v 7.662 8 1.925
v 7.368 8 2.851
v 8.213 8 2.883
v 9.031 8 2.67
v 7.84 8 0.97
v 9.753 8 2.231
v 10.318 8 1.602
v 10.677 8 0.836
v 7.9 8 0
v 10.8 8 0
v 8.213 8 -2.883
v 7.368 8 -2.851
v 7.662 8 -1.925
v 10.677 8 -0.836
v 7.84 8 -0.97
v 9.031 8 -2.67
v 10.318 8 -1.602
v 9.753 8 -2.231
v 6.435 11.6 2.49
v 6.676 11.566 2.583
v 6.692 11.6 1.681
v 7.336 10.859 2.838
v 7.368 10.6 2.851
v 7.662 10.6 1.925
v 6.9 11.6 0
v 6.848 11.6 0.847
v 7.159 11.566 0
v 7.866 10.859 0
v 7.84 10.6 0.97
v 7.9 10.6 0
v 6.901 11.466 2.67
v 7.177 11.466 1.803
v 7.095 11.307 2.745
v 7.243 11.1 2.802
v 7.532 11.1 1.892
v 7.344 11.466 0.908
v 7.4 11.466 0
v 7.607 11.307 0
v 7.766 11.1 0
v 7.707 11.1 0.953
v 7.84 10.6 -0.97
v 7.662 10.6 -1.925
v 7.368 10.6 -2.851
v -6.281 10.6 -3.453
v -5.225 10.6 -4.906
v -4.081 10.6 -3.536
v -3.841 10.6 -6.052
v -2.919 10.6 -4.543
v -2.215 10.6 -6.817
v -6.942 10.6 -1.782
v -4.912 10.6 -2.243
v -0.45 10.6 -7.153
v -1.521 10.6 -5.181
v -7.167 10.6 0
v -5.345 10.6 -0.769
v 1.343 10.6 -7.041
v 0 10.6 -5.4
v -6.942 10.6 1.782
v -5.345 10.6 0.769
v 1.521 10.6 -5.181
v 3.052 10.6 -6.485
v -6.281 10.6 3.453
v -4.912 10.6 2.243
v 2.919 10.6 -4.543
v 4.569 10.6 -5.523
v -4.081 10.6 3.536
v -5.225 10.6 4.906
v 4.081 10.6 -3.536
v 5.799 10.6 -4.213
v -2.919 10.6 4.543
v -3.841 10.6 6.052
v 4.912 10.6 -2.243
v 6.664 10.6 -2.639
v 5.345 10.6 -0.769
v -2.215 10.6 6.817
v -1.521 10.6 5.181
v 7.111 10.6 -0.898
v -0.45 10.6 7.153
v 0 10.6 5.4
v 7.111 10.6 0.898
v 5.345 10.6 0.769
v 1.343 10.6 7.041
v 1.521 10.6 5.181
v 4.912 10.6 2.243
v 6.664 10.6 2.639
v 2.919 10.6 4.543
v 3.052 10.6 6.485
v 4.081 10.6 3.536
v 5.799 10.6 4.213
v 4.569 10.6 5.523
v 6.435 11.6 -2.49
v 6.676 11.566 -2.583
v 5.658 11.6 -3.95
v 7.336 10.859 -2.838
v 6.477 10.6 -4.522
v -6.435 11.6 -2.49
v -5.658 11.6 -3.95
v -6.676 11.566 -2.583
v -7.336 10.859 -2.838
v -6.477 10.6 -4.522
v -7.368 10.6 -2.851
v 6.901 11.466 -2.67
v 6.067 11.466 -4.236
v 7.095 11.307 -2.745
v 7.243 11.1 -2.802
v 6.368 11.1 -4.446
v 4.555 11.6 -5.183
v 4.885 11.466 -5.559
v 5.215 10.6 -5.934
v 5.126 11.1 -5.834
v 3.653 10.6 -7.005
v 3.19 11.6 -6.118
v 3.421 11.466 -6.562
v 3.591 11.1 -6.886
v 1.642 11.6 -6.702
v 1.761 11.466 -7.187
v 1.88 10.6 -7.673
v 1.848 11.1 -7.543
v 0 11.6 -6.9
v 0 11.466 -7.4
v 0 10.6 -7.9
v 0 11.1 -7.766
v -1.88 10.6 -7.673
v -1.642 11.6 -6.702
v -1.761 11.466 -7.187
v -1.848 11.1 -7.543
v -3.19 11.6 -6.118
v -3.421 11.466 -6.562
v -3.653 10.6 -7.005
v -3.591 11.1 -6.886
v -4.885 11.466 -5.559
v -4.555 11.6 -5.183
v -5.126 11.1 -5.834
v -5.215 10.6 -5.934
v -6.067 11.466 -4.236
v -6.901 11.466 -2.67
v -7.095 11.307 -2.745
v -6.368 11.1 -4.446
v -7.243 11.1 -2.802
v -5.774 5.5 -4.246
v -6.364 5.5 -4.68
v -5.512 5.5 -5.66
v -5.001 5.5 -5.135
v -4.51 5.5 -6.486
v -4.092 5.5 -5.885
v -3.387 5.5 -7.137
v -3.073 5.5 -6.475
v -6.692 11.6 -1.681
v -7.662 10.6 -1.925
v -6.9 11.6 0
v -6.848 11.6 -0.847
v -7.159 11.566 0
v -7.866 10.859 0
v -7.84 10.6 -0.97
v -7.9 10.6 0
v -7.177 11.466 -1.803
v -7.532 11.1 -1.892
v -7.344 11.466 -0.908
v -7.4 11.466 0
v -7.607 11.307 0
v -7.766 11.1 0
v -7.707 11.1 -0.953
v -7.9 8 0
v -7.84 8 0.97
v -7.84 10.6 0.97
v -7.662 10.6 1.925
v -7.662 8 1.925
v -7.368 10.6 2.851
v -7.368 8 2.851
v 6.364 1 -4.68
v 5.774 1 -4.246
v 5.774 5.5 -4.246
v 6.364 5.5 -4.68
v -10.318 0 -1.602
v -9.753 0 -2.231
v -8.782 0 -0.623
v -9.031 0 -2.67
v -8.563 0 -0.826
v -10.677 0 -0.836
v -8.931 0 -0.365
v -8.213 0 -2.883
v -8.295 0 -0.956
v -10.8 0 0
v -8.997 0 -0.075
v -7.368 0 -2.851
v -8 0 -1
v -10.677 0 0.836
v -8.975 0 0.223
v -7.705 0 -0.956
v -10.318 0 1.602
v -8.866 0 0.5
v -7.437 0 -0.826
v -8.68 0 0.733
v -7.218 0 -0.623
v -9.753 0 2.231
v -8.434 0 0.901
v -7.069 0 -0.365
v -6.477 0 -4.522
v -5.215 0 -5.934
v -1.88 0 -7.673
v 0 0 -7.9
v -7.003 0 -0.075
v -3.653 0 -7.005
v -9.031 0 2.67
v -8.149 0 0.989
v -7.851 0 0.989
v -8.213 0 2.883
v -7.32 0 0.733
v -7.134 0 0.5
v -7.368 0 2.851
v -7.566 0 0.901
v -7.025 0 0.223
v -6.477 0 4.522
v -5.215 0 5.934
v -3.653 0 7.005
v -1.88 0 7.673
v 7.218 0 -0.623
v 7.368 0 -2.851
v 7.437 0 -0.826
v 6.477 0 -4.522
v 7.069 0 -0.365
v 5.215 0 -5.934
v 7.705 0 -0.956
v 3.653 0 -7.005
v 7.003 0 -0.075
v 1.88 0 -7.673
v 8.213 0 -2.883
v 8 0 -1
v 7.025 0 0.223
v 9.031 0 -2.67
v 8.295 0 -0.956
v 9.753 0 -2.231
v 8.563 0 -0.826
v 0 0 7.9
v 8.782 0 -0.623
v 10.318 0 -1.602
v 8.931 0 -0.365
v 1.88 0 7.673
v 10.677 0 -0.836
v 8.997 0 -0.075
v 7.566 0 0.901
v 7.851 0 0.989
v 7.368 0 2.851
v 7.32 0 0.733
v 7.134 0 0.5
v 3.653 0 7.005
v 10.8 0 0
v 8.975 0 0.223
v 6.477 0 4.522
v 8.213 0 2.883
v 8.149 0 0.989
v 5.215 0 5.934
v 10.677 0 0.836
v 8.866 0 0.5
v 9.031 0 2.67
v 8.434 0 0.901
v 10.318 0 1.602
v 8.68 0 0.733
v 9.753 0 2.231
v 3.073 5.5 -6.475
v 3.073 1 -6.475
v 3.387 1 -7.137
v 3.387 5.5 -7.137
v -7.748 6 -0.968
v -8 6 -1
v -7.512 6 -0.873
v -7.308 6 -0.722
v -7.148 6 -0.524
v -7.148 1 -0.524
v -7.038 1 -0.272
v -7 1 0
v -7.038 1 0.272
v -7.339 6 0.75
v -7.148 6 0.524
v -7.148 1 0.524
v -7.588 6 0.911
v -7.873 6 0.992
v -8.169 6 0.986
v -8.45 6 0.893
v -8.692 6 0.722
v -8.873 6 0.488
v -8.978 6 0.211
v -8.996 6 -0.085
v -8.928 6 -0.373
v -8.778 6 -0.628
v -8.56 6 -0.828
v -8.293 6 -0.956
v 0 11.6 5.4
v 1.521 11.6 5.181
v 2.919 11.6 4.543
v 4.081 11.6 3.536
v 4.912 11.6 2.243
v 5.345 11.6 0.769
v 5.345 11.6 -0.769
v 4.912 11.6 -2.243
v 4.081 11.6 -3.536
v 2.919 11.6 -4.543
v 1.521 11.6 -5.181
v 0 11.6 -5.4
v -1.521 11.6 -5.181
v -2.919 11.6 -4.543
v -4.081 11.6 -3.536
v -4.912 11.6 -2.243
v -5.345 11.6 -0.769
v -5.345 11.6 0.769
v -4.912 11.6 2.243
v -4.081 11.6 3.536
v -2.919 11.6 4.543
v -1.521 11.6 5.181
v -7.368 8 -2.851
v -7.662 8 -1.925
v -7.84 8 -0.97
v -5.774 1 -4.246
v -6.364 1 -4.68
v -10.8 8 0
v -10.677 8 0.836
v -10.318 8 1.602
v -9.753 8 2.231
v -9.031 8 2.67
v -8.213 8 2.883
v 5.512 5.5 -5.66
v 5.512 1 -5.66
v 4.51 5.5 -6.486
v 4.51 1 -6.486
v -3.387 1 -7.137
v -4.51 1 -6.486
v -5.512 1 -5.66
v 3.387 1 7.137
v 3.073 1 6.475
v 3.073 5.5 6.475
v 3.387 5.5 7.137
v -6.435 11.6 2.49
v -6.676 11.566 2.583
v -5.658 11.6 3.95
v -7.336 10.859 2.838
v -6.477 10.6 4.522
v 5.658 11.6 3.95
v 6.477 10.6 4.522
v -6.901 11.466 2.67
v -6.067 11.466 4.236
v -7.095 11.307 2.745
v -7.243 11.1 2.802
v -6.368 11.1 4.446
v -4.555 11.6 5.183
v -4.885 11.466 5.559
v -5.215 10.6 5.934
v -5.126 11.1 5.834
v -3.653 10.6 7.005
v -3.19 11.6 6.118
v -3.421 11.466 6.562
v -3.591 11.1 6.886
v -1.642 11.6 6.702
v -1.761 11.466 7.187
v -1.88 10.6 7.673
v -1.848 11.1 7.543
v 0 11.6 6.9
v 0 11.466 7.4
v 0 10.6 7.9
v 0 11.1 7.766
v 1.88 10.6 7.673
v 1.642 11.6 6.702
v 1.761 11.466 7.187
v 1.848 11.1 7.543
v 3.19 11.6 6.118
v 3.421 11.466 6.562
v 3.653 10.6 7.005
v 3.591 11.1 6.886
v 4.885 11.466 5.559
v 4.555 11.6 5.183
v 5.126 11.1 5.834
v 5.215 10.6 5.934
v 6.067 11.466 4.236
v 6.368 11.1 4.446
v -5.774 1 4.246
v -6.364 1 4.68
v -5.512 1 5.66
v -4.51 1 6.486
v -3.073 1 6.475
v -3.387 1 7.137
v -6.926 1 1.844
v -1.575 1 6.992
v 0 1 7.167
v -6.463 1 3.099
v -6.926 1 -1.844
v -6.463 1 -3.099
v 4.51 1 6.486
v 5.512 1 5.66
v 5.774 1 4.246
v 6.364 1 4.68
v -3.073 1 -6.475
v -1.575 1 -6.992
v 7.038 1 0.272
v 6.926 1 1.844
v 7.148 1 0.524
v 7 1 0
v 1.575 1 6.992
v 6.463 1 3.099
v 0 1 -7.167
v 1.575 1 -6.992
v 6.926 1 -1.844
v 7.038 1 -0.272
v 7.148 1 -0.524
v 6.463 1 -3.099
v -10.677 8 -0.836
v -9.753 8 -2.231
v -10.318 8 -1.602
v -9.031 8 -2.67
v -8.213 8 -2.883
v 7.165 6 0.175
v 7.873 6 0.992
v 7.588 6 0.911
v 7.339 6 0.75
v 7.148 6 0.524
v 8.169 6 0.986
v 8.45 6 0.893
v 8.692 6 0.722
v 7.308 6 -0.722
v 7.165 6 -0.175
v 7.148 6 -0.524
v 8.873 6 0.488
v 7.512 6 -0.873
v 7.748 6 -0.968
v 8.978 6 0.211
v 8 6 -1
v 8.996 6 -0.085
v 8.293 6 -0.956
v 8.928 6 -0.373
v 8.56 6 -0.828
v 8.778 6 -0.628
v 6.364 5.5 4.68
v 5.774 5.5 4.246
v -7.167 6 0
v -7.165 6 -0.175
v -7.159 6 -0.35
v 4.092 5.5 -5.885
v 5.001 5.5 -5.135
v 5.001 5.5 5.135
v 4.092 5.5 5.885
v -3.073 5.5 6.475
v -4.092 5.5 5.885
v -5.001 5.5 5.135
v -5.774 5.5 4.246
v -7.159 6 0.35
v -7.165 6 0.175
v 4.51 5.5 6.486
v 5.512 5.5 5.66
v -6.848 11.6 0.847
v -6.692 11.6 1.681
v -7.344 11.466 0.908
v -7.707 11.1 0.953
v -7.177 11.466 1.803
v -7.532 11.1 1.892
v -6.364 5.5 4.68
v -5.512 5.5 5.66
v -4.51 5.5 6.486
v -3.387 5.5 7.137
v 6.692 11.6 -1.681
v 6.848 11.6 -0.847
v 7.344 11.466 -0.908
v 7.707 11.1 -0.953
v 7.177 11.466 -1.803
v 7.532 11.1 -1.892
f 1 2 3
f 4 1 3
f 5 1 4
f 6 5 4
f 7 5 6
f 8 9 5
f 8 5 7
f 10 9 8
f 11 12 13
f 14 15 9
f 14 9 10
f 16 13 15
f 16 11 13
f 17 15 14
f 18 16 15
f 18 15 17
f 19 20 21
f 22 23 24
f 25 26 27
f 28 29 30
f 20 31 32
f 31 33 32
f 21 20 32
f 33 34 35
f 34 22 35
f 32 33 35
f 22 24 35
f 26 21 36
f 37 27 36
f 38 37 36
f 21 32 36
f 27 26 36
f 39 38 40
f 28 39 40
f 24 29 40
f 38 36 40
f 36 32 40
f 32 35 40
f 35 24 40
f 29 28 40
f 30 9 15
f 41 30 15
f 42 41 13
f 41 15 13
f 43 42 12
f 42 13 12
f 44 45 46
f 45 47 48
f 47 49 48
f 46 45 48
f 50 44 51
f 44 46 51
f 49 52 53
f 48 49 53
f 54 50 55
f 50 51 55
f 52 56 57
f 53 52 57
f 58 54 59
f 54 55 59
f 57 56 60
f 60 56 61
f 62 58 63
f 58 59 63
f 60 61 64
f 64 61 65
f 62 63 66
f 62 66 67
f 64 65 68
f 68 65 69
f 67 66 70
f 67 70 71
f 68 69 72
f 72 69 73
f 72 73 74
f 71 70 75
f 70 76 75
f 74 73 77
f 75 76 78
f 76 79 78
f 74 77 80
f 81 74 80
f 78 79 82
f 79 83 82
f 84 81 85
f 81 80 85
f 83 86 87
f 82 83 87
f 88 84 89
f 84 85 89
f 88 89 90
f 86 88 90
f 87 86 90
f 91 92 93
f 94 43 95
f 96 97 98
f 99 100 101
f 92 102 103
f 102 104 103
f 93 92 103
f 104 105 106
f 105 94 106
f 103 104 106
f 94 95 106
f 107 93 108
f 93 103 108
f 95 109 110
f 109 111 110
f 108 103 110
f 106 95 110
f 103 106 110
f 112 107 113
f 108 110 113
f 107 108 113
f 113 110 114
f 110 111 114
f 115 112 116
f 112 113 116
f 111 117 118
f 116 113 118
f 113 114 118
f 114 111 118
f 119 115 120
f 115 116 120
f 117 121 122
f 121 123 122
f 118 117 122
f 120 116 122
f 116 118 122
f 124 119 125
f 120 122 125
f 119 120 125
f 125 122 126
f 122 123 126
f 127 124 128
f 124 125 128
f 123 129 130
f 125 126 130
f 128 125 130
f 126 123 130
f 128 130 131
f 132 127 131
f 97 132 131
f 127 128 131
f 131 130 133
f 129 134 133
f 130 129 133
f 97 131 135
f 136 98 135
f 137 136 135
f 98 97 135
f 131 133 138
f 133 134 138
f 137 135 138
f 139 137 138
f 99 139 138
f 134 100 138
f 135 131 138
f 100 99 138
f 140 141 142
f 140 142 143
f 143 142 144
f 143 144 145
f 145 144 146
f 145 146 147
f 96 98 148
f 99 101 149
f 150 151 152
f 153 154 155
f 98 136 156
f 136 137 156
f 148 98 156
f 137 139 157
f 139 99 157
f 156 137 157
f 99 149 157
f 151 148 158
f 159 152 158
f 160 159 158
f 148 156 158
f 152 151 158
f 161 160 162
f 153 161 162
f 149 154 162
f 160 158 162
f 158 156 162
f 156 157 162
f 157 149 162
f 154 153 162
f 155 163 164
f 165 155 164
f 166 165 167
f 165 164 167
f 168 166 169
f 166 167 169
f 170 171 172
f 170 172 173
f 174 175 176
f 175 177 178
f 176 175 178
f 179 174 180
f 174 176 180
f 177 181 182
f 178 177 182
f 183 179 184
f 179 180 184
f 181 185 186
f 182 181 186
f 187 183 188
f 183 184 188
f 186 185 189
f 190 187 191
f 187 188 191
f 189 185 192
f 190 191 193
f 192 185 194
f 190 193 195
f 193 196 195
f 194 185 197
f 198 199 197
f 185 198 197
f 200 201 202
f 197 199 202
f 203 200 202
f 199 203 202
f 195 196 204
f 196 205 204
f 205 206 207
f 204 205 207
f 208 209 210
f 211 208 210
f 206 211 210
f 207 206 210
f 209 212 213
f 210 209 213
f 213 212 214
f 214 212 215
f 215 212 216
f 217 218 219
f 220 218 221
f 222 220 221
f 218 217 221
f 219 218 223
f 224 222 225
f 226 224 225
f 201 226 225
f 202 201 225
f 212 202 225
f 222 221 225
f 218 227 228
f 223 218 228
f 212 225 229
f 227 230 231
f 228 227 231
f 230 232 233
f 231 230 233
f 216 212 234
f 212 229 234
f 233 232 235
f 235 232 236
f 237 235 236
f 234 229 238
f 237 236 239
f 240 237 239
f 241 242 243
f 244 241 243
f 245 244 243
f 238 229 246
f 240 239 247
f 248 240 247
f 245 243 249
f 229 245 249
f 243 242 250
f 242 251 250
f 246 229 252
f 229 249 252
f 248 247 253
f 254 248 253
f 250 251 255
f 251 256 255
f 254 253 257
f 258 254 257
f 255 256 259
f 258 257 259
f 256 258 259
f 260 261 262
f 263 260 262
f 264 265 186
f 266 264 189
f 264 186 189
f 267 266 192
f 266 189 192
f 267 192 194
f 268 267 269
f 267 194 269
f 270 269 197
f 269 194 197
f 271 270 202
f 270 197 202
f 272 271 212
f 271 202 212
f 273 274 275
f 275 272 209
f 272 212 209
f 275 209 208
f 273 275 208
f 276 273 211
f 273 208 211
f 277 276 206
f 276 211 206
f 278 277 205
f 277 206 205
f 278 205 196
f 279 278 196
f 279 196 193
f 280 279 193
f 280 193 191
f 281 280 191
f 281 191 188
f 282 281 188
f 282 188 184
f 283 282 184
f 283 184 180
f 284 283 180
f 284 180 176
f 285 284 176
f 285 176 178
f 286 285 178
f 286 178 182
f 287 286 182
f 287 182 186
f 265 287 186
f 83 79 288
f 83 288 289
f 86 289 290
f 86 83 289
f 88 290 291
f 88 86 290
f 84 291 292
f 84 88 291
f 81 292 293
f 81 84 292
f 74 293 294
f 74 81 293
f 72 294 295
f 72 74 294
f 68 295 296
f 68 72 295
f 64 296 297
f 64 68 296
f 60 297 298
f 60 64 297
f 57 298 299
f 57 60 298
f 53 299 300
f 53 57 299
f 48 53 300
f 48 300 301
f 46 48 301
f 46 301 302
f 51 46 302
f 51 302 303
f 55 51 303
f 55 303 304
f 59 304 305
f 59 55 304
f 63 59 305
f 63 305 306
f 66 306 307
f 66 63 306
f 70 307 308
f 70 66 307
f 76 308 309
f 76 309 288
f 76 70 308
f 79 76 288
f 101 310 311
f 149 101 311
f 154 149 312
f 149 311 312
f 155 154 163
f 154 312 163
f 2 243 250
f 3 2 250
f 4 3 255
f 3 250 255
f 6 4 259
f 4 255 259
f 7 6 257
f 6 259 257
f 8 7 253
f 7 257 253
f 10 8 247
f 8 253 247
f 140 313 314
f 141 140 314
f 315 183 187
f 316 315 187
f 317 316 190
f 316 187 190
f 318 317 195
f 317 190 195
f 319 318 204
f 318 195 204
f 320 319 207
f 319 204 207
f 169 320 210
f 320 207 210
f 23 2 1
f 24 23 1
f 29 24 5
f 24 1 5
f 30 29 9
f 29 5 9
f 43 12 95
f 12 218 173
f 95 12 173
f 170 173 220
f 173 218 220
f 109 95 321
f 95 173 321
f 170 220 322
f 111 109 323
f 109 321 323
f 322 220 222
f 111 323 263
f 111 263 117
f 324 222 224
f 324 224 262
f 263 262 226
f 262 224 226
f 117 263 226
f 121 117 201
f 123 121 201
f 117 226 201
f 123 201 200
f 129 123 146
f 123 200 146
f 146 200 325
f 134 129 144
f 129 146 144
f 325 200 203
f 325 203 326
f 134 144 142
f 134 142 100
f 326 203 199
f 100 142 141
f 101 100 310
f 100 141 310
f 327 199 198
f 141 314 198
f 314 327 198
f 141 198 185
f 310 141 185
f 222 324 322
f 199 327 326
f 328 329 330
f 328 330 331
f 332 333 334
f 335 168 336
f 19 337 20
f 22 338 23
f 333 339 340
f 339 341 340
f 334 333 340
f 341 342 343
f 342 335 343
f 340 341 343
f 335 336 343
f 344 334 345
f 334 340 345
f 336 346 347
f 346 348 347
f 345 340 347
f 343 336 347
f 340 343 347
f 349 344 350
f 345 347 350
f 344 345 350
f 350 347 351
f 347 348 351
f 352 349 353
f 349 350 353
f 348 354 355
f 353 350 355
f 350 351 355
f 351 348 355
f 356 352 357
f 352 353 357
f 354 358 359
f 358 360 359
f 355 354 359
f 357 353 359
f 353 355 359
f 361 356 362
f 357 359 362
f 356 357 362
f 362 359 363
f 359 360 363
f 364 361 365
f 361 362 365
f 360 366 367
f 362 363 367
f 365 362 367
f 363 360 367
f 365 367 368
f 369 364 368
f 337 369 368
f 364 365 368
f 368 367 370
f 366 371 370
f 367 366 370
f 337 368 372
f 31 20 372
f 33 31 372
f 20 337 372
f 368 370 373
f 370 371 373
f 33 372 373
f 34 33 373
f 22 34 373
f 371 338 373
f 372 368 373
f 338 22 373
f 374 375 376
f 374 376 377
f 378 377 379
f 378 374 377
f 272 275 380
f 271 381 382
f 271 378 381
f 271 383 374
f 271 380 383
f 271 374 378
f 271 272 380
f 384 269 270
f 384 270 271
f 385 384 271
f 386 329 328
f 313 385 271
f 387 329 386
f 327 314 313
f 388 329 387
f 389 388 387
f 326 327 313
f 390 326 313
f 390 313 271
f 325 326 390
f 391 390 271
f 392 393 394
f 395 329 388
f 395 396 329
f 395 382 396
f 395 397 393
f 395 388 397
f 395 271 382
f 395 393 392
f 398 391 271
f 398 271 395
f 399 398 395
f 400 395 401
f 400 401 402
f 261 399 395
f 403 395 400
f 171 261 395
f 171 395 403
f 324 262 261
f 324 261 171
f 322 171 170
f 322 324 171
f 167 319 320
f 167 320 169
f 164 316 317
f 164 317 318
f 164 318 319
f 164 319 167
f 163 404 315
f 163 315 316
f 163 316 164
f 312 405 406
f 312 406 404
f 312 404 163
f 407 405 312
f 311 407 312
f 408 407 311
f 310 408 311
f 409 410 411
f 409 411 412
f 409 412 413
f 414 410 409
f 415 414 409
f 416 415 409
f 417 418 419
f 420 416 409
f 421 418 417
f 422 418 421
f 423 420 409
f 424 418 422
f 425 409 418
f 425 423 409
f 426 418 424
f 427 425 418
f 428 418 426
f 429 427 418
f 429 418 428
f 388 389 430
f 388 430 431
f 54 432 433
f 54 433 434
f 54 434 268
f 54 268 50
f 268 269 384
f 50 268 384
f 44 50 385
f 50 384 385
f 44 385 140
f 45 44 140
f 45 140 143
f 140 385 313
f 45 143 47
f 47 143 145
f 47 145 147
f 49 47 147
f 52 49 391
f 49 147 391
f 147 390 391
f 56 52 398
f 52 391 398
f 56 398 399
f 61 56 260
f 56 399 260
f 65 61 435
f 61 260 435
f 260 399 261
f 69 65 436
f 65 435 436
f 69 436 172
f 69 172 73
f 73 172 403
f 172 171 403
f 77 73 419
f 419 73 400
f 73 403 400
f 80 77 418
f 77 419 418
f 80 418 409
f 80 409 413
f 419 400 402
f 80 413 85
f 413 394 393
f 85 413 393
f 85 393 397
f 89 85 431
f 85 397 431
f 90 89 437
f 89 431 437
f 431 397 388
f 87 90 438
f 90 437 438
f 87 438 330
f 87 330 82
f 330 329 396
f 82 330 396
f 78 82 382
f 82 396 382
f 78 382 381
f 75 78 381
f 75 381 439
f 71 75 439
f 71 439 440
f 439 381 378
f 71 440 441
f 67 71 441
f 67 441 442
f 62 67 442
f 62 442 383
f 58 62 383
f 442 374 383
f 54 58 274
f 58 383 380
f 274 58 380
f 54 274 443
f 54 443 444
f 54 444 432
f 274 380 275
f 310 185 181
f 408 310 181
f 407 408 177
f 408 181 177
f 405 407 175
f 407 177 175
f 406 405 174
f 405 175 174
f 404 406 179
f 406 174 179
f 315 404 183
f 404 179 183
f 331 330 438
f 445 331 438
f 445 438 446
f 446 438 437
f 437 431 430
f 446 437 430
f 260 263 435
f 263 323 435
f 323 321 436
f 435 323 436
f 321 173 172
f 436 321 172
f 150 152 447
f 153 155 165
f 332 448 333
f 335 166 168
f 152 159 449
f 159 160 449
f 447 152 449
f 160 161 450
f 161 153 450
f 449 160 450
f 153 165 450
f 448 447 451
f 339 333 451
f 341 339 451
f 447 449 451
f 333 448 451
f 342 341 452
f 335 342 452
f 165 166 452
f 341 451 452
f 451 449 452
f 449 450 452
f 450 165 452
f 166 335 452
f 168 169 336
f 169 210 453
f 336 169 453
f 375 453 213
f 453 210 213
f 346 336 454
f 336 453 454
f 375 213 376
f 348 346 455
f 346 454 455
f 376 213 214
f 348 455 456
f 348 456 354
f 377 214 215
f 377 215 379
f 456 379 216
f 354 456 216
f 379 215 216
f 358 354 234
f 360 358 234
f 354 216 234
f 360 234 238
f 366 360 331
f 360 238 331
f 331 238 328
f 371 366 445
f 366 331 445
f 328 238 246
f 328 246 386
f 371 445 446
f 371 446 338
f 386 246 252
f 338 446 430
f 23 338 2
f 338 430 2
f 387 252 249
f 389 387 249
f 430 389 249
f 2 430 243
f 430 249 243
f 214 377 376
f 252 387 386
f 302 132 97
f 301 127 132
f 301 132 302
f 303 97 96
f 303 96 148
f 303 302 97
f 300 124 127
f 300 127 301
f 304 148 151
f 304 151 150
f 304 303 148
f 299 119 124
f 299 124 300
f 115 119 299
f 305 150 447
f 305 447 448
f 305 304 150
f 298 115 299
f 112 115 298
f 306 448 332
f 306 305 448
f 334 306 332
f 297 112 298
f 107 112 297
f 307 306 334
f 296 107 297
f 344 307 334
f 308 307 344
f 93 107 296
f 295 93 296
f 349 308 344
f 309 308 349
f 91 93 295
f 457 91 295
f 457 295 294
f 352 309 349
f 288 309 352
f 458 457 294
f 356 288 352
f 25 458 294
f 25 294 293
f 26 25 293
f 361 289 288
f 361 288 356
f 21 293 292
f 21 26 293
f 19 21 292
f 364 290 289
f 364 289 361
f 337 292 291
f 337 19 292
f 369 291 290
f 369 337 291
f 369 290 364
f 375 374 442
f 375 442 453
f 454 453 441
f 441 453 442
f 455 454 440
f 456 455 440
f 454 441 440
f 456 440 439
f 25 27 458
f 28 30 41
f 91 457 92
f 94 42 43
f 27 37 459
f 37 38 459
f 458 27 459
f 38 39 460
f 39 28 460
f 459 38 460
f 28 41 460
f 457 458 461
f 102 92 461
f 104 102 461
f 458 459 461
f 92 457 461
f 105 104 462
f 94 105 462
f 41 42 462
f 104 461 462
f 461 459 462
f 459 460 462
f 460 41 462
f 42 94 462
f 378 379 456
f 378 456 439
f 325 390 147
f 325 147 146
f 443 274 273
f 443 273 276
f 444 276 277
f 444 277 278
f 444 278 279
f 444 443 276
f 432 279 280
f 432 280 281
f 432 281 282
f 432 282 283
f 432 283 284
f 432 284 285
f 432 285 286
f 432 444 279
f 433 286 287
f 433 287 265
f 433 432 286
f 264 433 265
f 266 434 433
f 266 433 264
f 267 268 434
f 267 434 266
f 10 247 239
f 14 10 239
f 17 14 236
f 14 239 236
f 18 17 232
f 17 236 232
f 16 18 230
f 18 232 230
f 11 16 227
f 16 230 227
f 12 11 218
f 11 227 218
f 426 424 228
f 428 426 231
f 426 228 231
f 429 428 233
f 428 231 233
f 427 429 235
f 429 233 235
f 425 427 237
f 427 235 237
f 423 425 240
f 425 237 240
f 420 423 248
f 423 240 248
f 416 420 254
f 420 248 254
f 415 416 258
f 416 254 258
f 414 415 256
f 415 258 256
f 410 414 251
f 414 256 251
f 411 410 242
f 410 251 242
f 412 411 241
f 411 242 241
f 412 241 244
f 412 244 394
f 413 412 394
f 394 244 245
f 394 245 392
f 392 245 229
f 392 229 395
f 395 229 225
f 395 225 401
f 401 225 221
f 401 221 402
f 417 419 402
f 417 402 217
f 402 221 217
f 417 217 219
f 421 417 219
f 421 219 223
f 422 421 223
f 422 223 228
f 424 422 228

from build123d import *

# Parameters (mm, degrees)
BOSS_EXTRUDE1_DEPTH      = 11.6
BOSS_EXTRUDE2_DEPTH      = 8
SKETCH2_R                = 7.167468034
BOSS_EXTRUDE3_DEPTH      = 1
BOSS_EXTRUDE4_START      = -1
SKETCH3_R                = 7.167468034
SKETCH3_R_2              = 5.4
BOSS_EXTRUDE4_DEPTH      = 1
FILLET1_R                = 1
WRAP1_SECTION_W          = 3
WRAP1_SECTION_H          = 4.5
WRAP1_ANGLE              = 28.285258241
WRAP1_SECTOR_2_SECTION_W = 3
WRAP1_SECTOR_2_SECTION_H = 4.5
WRAP1_SECTOR_2_ANGLE     = 28.285258241
WRAP2_START              = 1
WRAP2_DEPTH              = 4.5
SKETCH6_R                = 1
CUT_EXTRUDE1_DEPTH       = 6


# Read off the part's stored shape, not the designer's step: Wrap2
with BuildPart() as part:
    # Sketch1 → Boss-Extrude1 (new body)
    with BuildSketch(Plane(origin=(0, 0, 0), x_dir=(1, 0, 0), z_dir=(0, 1, 0))):
        with BuildLine():
            ThreePointArc((-7.167468034, 0), (0, 7.167468034), (7.167468034, 0))
            Line((7.167468034, 0), (7.9, 0))
            ThreePointArc((7.9, 0), (7.765790365, 1.45), (7.367721519, 2.850733172))
            ThreePointArc((7.367721519, 2.850733172), (0, 7.9), (-7.367721519, 2.850733172))
            ThreePointArc((-7.367721519, 2.850733172), (-7.765790365, 1.45), (-7.9, 0))
            Line((-7.9, 0), (-7.167468034, 0))
        make_face()
        with BuildLine():
            Line((7.9, 0), (7.167468034, 0))
            ThreePointArc((7.167468034, 0), (0, -7.167468034), (-7.167468034, 0))
            Line((-7.167468034, 0), (-7.9, 0))
            ThreePointArc((-7.9, 0), (-7.765790365, -1.45), (-7.367721519, -2.850733172))
            ThreePointArc((-7.367721519, -2.850733172), (0, -7.9), (7.367721519, -2.850733172))
            ThreePointArc((7.367721519, -2.850733172), (7.765790365, -1.45), (7.9, 0))
        make_face()
    extrude(amount=BOSS_EXTRUDE1_DEPTH)

    # Sketch1<3> → Boss-Extrude2 (add)
    with BuildSketch(Plane(origin=(0, 0, 0), x_dir=(1, 0, 0), z_dir=(0, 1, 0))):
        with BuildLine():
            ThreePointArc((-7.367721519, -2.850733172), (-7.765790365, -1.45), (-7.9, 0))
            Line((-7.9, 0), (-10.8, 0))
            ThreePointArc((-10.8, 0), (-9.75288861, -2.230875119), (-7.367721519, -2.850733172))
        make_face()
        with BuildLine():
            Line((-10.8, 0), (-7.9, 0))
            ThreePointArc((-7.9, 0), (-7.765790365, 1.45), (-7.367721519, 2.850733172))
            ThreePointArc((-7.367721519, 2.850733172), (-9.75288861, 2.230875119), (-10.8, 0))
        make_face()
        with BuildLine():
            ThreePointArc((7.367721519, 2.850733172), (7.765790365, 1.45), (7.9, 0))
            Line((7.9, 0), (10.8, 0))
            ThreePointArc((10.8, 0), (9.75288861, 2.230875119), (7.367721519, 2.850733172))
        make_face()
        with BuildLine():
            Line((10.8, 0), (7.9, 0))
            ThreePointArc((7.9, 0), (7.765790365, -1.45), (7.367721519, -2.850733172))
            ThreePointArc((7.367721519, -2.850733172), (9.75288861, -2.230875119), (10.8, 0))
        make_face()
    extrude(amount=BOSS_EXTRUDE2_DEPTH)

    # Sketch2 → Boss-Extrude3 (add)
    with BuildSketch(Plane(origin=(0, 0, 0), x_dir=(1, 0, 0), z_dir=(0, 1, 0))):
        with Locations(Location((0, 0, 0), (0, 0, 270))):
            Circle(SKETCH2_R)
    extrude(amount=BOSS_EXTRUDE3_DEPTH)

    # Sketch3 → Boss-Extrude4 (add)
    with BuildSketch(Plane(origin=(0, 11.6, 0), x_dir=(1, 0, 0), z_dir=(0, 1, 0)).offset(BOSS_EXTRUDE4_START)):
        with Locations(Location((0, 0, 0), (0, 0, 270))):
            Circle(SKETCH3_R)
        with Locations(Location((0, 0, 0), (0, 0, 270))):
            Circle(SKETCH3_R_2, mode=Mode.SUBTRACT)
    extrude(amount=BOSS_EXTRUDE4_DEPTH)

    # Fillet1
    fillet1_edges = [part.edges().sort_by_distance(p)[0] for p in [
        (7.9, 11.6, 0),
    ]]
    fillet(fillet1_edges, radius=FILLET1_R)

    # Wrap1 section (on wrap section) → Wrap1 (revolve, cut)
    with BuildSketch(Plane(origin=(0, 0, 0), x_dir=(-0.8056126558283049, 0, -0.5924426122159557), z_dir=(-0.5924426122159557, 0, 0.8056126558283049))):
        with Locations((6.4, -3.25)):
            Rectangle(WRAP1_SECTION_W, WRAP1_SECTION_H)
    revolve(axis=Axis((0, 0, 0), (0, -1, 0)), revolution_arc=WRAP1_ANGLE, mode=Mode.SUBTRACT)

    # Wrap1 sector 2 section (on wrap section) → Wrap1 sector 2 (revolve, cut)
    with BuildSketch(Plane(origin=(0, 0, 0), x_dir=(0.4286861079278577, 0, -0.9034534967941986), z_dir=(-0.9034534967941986, 0, -0.4286861079278577))):
        with Locations((6.4, -3.25)):
            Rectangle(WRAP1_SECTOR_2_SECTION_W, WRAP1_SECTOR_2_SECTION_H)
    revolve(axis=Axis((0, 0, 0), (0, -1, 0)), revolution_arc=WRAP1_SECTOR_2_ANGLE, mode=Mode.SUBTRACT)

    # Wrap2 outline → Wrap2 (cut)
    with BuildSketch(Plane(origin=(0, 0, 0), x_dir=(1, 0, 0), z_dir=(0, 1, 0)).offset(WRAP2_START)):
        with BuildLine():
            ThreePointArc((5.774202958, -4.246313485), (4.561660138, -5.528458629), (3.072593975, -6.475474058))
            Line((3.072593975, -6.475474058), (3.386620253, -7.137282625))
            ThreePointArc((3.386620253, -7.137282625), (5.027872453, -6.093480007), (6.364339981, -4.680296637))
            Line((6.364339981, -4.680296637), (5.774202958, -4.246313485))
        make_face()
        with BuildLine():
            Line((-3.386620253, -7.137282625), (-3.072593975, -6.475474058))
            ThreePointArc((-3.072593975, -6.475474058), (-4.561660138, -5.528458629), (-5.774202958, -4.246313485))
            Line((-5.774202958, -4.246313485), (-6.364339981, -4.680296637))
            ThreePointArc((-6.364339981, -4.680296637), (-5.027872453, -6.093480007), (-3.386620253, -7.137282625))
        make_face()
    extrude(amount=WRAP2_DEPTH, mode=Mode.SUBTRACT)

    # Sketch6 → Cut-Extrude1 (cut)
    with BuildSketch(Plane.XZ):
        with Locations(Location((-8, 0, 0), (0, 0, 270))):
            Circle(SKETCH6_R)
        with Locations(Location((8, 0, 0), (0, 0, 270))):
            Circle(SKETCH6_R)
    extrude(amount=-CUT_EXTRUDE1_DEPTH, mode=Mode.SUBTRACT)


solid = part.part
